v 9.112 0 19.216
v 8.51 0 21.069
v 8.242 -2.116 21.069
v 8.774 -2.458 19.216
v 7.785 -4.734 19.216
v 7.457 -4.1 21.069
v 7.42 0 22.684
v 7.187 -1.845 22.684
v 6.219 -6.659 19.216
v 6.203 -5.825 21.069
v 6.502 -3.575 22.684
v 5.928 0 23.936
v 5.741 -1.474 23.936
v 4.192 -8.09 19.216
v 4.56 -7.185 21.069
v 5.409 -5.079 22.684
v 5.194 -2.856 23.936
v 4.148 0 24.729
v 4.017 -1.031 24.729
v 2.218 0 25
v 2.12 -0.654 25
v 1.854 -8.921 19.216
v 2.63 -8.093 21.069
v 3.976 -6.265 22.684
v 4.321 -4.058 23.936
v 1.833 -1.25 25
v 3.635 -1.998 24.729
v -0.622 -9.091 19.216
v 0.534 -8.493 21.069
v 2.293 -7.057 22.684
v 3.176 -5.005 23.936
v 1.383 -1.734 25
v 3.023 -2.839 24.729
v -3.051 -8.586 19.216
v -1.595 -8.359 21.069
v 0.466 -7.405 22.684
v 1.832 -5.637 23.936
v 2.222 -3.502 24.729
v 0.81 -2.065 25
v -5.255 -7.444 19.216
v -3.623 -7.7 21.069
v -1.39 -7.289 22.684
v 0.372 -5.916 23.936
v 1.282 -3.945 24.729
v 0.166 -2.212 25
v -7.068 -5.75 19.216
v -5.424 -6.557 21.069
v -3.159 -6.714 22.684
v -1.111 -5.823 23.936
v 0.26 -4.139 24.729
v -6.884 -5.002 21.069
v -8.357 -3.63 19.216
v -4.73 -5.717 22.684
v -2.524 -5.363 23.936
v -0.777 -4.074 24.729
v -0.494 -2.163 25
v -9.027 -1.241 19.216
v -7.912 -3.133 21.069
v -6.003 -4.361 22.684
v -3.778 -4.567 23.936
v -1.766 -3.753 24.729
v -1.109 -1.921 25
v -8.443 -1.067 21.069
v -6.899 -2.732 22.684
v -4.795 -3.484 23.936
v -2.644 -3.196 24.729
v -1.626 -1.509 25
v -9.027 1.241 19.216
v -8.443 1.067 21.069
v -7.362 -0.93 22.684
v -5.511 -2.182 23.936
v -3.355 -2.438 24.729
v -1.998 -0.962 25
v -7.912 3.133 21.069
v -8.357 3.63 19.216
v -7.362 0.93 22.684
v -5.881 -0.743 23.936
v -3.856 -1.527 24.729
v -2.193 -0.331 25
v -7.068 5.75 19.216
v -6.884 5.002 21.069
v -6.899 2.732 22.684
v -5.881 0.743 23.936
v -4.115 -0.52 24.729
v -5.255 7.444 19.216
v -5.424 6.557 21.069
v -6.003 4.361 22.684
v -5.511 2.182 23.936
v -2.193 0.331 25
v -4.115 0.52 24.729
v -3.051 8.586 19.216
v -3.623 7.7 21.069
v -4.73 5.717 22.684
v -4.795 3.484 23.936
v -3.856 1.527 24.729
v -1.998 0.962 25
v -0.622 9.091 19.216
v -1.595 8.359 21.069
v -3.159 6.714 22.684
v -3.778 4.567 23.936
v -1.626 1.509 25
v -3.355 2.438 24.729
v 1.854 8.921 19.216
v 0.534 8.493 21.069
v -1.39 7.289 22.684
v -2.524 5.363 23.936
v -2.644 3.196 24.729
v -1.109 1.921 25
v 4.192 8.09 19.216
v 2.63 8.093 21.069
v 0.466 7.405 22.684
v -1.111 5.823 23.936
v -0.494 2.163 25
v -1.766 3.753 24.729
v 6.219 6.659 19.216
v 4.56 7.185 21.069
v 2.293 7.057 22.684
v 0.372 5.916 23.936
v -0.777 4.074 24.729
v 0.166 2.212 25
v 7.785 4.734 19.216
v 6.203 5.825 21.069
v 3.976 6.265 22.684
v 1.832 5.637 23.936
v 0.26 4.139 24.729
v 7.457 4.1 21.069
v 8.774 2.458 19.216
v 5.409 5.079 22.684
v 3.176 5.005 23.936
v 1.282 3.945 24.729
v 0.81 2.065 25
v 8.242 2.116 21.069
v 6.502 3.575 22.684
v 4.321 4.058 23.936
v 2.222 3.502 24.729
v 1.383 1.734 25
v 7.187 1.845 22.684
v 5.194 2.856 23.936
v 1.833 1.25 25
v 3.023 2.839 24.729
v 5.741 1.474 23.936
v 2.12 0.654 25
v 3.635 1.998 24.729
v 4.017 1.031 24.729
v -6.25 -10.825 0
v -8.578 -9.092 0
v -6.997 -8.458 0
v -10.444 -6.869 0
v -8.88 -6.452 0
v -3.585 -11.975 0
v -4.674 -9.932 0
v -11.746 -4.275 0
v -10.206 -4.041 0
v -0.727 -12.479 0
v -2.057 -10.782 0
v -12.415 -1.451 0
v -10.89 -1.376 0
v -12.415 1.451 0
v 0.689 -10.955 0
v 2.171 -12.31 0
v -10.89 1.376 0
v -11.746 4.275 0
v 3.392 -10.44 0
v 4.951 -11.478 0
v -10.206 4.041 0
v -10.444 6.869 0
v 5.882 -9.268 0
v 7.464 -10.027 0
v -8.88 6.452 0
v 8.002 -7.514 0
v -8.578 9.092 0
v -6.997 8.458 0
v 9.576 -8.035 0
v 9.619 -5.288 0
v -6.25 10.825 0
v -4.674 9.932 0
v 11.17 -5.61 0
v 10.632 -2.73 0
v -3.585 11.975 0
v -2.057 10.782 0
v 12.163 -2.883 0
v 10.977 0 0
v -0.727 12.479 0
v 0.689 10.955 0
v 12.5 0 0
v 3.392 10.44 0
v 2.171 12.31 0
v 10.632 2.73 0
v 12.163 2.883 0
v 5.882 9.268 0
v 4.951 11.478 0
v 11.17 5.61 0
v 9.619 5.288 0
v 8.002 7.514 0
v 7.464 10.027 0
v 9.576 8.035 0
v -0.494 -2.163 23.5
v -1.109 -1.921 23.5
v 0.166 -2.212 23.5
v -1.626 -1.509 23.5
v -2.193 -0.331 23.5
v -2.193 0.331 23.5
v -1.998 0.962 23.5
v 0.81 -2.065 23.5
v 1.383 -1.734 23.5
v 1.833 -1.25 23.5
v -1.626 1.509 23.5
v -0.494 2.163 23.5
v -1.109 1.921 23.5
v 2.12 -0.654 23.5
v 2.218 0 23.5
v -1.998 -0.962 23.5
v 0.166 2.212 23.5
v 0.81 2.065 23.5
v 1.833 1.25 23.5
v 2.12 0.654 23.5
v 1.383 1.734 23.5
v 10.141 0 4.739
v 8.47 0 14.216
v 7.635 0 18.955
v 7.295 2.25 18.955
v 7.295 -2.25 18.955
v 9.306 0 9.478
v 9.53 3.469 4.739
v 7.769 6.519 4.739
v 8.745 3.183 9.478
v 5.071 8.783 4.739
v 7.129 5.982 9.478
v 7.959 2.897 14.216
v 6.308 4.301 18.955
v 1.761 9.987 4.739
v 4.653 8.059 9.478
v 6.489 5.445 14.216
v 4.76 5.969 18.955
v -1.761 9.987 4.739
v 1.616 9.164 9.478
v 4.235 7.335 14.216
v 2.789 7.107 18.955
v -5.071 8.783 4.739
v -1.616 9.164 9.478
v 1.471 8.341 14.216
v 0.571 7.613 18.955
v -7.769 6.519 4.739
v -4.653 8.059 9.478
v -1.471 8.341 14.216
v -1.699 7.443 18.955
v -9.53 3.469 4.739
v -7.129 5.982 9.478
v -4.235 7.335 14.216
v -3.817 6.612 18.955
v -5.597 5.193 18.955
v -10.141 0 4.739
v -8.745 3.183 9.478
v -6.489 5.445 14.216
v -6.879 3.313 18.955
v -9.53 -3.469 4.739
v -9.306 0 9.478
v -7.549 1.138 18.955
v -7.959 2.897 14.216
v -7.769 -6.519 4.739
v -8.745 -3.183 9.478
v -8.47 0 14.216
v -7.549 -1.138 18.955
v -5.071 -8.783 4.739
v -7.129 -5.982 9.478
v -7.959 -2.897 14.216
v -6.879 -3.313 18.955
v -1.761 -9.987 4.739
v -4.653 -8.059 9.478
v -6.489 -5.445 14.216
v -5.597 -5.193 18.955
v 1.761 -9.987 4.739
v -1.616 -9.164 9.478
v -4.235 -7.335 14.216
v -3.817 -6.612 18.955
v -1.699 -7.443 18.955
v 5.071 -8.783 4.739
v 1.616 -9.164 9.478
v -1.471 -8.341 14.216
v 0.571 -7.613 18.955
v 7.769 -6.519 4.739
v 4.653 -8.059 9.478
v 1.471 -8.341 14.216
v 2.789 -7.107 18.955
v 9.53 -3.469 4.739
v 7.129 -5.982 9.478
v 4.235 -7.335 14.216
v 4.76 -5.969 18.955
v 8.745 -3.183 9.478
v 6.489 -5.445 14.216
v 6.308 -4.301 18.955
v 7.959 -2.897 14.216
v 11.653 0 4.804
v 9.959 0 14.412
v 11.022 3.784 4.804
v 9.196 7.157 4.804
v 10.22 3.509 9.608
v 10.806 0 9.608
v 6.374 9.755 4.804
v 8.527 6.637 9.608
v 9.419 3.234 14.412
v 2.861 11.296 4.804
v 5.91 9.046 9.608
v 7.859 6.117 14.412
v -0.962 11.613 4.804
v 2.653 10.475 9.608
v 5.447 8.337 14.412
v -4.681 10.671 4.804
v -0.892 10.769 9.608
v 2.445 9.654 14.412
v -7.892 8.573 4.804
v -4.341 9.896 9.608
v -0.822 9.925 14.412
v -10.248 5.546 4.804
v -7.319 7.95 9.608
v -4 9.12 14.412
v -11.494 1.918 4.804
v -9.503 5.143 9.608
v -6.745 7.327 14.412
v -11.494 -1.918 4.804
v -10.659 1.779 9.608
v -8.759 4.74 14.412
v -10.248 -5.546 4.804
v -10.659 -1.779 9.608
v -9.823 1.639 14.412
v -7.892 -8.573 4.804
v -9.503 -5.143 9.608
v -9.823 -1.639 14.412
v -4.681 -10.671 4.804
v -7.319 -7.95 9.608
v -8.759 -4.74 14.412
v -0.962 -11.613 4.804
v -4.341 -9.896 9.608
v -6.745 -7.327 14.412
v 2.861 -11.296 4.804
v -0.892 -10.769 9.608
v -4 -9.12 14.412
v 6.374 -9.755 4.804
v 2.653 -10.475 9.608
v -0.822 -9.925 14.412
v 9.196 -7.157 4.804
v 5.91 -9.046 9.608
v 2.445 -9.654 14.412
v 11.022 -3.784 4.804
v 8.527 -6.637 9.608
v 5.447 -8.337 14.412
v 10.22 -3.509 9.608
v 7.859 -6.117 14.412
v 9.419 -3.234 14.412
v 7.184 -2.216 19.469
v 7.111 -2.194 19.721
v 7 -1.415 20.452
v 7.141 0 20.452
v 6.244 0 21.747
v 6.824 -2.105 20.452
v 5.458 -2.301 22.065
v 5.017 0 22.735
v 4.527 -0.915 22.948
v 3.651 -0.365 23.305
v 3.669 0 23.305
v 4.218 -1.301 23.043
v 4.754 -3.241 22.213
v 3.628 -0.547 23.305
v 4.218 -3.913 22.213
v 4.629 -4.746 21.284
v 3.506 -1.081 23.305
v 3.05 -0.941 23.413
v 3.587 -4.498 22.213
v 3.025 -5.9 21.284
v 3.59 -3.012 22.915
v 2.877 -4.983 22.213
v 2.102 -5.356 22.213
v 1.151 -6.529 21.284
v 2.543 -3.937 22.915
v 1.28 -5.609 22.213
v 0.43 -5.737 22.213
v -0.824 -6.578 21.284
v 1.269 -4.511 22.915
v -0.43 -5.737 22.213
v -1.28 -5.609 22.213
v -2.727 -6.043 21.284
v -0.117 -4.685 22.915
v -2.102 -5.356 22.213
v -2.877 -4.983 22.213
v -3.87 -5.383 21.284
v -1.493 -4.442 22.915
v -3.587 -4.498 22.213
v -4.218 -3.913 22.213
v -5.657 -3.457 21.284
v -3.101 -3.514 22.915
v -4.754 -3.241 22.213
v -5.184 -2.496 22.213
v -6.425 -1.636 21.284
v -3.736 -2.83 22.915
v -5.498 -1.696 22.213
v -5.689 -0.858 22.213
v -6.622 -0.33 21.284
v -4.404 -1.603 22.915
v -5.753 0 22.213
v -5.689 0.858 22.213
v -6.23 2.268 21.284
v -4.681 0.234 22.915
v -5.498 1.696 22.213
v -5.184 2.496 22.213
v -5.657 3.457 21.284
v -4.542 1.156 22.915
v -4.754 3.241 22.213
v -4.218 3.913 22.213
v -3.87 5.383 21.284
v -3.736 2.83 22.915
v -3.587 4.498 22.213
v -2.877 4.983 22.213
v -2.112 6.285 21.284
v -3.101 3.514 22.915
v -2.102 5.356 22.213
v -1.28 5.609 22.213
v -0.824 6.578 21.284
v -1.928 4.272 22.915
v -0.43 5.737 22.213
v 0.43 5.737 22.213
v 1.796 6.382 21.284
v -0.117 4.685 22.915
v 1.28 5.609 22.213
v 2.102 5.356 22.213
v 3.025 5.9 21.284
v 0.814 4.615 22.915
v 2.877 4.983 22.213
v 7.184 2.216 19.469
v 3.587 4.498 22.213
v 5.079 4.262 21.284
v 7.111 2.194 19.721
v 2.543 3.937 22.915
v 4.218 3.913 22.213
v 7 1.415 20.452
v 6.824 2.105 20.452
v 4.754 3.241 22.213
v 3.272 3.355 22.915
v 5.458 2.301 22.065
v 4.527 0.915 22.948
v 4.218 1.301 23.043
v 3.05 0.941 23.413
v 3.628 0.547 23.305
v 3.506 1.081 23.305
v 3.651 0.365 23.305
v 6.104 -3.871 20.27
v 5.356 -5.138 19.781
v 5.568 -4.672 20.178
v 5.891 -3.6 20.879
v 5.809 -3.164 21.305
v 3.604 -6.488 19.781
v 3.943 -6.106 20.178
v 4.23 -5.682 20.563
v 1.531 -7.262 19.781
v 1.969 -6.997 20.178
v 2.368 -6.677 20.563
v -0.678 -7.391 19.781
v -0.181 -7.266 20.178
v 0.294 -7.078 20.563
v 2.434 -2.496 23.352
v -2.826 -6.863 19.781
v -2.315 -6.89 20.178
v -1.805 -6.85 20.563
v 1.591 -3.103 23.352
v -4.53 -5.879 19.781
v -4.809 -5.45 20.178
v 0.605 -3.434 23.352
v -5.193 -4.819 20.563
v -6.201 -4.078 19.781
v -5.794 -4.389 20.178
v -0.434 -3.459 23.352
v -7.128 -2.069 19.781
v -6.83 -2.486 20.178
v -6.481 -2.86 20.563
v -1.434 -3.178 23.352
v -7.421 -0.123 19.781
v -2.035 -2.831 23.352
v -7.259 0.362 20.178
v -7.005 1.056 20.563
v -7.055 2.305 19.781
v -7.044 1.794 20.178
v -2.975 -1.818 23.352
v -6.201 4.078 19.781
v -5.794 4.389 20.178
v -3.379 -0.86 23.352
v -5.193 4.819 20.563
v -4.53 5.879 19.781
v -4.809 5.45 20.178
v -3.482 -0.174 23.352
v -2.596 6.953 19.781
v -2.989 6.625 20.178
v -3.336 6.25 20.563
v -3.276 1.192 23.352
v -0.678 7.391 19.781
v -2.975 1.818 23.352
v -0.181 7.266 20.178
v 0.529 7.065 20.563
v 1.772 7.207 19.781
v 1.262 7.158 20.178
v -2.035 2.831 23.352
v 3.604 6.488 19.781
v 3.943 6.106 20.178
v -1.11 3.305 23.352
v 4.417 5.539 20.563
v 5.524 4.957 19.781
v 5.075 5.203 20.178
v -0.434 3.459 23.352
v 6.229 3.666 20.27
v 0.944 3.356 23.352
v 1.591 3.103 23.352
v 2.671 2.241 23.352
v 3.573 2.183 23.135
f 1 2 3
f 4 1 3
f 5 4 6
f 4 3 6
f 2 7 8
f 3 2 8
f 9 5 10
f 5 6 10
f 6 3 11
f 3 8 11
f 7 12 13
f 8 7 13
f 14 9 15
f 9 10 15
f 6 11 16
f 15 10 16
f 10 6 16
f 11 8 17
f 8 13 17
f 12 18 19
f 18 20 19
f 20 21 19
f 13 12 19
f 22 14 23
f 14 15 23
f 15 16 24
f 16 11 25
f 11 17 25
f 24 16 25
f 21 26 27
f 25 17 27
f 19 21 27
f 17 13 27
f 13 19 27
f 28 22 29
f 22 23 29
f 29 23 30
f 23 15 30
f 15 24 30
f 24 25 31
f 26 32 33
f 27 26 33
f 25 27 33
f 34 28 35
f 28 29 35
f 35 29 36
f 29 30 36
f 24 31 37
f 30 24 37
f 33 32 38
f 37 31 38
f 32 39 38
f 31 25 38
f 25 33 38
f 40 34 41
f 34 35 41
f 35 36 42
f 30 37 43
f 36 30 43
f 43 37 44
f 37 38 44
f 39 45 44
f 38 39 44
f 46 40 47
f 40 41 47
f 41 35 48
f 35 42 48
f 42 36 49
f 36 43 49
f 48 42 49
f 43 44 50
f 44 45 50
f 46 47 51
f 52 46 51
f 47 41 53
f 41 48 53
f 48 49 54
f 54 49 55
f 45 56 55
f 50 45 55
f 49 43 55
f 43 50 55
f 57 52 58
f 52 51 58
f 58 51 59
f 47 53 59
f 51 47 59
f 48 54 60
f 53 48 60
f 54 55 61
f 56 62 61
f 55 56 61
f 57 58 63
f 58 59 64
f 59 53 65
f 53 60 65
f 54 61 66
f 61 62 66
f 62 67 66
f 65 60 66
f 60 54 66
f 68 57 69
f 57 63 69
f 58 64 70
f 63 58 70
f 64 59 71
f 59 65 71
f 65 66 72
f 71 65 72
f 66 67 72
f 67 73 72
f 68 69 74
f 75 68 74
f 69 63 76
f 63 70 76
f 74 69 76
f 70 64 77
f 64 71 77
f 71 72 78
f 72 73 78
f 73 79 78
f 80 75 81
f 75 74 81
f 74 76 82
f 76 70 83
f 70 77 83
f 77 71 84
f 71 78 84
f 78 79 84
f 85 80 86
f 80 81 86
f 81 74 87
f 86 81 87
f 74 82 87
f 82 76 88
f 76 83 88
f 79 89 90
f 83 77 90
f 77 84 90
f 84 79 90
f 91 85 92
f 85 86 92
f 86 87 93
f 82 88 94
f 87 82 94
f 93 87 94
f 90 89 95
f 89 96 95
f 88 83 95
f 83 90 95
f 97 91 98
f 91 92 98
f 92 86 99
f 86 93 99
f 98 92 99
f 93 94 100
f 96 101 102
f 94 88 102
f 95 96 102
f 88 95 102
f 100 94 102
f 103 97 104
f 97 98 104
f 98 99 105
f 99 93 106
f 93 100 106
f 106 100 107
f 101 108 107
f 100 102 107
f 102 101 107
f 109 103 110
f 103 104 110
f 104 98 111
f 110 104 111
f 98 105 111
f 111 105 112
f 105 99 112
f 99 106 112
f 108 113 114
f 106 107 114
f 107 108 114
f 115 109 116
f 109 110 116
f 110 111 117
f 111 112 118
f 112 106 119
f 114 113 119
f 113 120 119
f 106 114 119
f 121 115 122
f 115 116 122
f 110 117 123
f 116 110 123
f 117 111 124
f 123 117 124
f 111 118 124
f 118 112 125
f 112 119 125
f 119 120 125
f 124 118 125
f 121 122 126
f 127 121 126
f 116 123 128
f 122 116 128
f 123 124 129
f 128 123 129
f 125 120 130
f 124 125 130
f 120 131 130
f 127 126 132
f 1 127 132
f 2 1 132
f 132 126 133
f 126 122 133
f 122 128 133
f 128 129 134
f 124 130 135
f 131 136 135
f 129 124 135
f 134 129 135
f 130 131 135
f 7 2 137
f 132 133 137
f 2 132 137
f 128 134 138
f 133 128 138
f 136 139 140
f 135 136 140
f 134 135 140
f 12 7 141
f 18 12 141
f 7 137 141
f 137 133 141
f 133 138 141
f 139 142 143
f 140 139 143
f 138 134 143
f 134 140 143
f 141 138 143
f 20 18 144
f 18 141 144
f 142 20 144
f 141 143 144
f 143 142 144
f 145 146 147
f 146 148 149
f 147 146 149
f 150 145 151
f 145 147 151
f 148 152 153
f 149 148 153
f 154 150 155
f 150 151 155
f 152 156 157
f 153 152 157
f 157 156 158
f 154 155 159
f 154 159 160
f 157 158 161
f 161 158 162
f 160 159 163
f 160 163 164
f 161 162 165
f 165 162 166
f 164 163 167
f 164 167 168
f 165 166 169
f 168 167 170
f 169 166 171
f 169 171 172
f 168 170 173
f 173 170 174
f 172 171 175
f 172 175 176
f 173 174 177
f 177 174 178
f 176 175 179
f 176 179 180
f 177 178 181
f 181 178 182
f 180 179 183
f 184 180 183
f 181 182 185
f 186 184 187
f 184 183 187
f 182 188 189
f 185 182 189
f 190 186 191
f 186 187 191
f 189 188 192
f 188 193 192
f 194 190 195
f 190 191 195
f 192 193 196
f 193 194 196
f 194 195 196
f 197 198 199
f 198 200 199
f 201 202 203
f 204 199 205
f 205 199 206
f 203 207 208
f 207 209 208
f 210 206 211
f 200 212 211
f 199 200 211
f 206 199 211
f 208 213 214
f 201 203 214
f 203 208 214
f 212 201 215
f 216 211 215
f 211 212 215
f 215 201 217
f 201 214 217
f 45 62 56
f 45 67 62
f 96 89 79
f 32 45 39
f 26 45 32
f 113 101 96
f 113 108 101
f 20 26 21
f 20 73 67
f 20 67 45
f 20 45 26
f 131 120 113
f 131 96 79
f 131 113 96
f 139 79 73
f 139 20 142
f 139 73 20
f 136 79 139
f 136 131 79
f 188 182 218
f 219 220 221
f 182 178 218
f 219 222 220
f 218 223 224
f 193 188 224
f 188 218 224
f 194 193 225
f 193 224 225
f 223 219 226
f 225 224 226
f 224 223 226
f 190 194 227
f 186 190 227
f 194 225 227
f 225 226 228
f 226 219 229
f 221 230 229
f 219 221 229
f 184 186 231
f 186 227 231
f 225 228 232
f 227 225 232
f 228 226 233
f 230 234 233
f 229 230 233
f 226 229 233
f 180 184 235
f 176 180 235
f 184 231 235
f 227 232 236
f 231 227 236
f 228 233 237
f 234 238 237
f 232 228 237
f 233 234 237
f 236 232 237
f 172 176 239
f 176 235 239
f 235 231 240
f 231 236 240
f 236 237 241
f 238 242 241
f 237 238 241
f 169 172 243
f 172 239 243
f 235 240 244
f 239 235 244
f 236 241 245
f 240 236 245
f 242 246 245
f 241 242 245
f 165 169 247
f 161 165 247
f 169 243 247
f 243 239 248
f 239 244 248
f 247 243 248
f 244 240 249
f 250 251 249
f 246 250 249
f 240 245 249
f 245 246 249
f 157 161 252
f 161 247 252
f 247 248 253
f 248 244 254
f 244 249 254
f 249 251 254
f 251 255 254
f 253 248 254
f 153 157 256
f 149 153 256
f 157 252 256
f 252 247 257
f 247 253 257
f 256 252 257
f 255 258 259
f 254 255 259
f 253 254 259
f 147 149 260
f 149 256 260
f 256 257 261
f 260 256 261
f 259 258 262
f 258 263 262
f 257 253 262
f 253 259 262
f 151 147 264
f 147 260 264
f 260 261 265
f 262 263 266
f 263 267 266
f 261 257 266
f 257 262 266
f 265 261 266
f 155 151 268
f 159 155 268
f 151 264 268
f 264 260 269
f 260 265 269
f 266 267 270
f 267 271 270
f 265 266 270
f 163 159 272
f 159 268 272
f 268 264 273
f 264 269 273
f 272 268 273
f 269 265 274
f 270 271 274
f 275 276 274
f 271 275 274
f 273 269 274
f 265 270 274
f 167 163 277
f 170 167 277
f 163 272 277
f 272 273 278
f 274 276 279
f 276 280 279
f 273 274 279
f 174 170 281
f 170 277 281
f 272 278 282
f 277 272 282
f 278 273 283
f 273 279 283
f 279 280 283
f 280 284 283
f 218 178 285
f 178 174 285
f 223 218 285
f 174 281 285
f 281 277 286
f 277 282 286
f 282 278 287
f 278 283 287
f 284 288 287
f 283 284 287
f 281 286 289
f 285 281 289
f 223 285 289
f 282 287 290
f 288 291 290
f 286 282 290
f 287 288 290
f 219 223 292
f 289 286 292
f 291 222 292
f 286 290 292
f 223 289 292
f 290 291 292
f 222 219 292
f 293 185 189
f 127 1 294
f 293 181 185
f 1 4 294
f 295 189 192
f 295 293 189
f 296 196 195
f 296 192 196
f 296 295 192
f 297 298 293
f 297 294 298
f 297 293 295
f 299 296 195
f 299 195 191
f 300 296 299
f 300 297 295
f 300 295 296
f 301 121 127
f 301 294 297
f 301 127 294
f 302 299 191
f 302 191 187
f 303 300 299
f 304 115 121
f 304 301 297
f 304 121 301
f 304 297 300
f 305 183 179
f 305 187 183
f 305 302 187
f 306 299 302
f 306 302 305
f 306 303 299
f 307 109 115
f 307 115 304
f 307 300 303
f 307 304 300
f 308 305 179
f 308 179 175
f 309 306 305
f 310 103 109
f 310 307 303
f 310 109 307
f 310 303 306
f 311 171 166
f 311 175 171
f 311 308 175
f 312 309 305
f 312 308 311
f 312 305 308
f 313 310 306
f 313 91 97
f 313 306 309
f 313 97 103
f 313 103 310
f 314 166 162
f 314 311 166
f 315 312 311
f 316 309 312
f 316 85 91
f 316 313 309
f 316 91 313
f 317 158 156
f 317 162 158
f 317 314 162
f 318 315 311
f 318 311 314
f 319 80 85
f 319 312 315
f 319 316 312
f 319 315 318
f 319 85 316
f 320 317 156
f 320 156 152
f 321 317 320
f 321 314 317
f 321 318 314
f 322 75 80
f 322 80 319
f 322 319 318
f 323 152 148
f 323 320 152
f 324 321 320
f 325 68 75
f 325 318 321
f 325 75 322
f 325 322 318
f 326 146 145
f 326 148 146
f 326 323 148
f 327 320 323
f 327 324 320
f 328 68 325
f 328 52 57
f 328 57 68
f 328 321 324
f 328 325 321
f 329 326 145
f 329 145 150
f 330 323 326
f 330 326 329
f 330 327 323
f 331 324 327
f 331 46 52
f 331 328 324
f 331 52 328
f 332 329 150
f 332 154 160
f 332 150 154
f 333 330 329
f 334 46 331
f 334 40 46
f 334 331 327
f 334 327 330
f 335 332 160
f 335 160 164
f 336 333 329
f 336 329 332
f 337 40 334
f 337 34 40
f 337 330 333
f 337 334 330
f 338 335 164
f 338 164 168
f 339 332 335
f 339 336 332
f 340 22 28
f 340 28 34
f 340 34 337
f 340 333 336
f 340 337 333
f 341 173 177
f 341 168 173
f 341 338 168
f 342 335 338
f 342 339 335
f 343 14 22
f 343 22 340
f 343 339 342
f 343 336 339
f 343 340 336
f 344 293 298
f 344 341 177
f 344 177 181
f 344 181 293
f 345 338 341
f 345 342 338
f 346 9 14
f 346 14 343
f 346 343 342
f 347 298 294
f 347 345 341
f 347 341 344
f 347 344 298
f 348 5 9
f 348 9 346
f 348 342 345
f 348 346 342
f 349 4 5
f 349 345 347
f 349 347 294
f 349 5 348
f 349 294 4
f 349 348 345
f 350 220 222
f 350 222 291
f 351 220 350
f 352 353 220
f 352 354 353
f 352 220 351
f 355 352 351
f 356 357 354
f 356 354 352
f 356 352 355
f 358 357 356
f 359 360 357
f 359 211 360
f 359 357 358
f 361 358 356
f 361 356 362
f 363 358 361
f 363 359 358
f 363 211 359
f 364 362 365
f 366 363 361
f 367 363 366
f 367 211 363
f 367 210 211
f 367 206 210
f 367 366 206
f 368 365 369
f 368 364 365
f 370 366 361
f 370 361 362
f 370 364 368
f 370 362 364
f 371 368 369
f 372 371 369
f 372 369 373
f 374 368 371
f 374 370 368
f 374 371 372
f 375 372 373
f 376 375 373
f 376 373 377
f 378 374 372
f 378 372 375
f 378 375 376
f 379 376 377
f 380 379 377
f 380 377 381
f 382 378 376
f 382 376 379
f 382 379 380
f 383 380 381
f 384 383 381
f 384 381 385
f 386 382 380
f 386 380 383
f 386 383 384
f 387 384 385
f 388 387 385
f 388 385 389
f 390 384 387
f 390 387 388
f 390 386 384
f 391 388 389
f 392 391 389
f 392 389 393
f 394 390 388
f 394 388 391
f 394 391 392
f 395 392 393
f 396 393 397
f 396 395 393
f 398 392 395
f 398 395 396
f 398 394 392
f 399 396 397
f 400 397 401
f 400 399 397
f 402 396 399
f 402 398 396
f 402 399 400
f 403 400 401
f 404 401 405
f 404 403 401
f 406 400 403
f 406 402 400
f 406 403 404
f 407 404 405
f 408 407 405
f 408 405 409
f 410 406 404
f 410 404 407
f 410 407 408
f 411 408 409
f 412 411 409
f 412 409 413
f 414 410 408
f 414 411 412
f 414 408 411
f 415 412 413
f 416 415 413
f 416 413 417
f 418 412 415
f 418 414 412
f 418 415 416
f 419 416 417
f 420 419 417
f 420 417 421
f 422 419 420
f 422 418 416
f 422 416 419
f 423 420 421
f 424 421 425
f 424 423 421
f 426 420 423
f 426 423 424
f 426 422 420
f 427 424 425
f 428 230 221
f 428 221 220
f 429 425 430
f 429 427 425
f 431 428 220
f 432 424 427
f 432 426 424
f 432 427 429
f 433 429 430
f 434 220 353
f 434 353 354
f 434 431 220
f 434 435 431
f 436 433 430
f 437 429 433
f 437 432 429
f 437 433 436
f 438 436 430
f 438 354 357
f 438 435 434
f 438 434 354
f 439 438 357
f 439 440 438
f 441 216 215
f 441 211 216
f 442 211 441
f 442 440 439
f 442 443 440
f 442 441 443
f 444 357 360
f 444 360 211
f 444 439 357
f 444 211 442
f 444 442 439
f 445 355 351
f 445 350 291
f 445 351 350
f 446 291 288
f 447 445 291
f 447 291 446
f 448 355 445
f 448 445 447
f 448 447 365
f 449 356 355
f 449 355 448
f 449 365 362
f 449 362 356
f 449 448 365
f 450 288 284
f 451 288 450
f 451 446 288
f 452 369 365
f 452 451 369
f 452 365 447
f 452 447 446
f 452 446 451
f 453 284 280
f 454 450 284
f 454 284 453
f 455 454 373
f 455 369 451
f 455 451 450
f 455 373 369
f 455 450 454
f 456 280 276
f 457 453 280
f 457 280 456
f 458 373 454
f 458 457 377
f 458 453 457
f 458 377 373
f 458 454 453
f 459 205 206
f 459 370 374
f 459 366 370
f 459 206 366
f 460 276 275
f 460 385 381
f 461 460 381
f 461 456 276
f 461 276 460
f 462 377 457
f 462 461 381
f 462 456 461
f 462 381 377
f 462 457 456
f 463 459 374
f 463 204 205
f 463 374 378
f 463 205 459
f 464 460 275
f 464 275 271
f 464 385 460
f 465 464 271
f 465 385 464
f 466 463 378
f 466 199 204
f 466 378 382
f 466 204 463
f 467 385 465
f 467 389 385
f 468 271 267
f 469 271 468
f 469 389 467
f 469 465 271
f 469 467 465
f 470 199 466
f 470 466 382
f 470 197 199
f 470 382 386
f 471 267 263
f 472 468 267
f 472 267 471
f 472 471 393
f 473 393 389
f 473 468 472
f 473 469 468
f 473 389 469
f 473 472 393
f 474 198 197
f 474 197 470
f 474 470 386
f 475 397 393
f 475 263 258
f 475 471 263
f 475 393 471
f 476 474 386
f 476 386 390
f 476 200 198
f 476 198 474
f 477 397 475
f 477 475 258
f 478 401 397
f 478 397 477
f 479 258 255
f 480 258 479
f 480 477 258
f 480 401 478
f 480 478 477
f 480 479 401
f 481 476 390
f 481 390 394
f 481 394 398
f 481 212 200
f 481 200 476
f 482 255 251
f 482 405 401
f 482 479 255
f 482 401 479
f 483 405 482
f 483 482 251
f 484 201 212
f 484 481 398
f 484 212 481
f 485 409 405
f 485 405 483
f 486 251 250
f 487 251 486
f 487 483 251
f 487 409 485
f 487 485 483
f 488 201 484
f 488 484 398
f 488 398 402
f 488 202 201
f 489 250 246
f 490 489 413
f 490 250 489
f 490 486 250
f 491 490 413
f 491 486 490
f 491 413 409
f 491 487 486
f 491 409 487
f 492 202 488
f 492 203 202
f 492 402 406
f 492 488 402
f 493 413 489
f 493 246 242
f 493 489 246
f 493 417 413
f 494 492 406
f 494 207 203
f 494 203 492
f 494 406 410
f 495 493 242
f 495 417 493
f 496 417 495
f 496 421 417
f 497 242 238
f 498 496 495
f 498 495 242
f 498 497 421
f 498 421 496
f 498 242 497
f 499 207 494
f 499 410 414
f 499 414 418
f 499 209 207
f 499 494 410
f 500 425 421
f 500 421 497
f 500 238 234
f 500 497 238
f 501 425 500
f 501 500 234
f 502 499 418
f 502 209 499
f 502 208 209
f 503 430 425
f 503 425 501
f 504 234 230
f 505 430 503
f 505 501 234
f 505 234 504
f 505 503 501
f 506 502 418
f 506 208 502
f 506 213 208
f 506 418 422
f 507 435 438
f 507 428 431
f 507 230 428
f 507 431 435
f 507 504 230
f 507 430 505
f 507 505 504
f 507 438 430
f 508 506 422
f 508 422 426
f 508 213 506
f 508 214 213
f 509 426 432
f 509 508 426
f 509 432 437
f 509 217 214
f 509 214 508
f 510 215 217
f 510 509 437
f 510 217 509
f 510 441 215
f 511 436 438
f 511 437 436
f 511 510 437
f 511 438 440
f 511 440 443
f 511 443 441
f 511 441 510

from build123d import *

# Parameters (mm, degrees)
F0_R     = 12.5
F1_DEPTH = 25
F1_TAPER = 10
F2_R     = 7
F3_T     = -1.5


with BuildPart() as f1:
    # F0 (on Top) → F1 (new body)
    with BuildSketch(Plane.XY):
        Circle(F0_R)
    extrude(amount=F1_DEPTH, taper=F1_TAPER)

    # F2
    f2_edges = [f1.edges().sort_by_distance(p)[0] for p in [
        (-8.091825, 0, 25),
    ]]
    fillet(f2_edges, radius=F2_R)

    # F3
    f3_openings = [f1.faces().sort_by_distance(p)[0] for p in [
        (0, 0, 0),
    ]]
    offset(amount=F3_T, openings=f3_openings)


solid = f1.part
